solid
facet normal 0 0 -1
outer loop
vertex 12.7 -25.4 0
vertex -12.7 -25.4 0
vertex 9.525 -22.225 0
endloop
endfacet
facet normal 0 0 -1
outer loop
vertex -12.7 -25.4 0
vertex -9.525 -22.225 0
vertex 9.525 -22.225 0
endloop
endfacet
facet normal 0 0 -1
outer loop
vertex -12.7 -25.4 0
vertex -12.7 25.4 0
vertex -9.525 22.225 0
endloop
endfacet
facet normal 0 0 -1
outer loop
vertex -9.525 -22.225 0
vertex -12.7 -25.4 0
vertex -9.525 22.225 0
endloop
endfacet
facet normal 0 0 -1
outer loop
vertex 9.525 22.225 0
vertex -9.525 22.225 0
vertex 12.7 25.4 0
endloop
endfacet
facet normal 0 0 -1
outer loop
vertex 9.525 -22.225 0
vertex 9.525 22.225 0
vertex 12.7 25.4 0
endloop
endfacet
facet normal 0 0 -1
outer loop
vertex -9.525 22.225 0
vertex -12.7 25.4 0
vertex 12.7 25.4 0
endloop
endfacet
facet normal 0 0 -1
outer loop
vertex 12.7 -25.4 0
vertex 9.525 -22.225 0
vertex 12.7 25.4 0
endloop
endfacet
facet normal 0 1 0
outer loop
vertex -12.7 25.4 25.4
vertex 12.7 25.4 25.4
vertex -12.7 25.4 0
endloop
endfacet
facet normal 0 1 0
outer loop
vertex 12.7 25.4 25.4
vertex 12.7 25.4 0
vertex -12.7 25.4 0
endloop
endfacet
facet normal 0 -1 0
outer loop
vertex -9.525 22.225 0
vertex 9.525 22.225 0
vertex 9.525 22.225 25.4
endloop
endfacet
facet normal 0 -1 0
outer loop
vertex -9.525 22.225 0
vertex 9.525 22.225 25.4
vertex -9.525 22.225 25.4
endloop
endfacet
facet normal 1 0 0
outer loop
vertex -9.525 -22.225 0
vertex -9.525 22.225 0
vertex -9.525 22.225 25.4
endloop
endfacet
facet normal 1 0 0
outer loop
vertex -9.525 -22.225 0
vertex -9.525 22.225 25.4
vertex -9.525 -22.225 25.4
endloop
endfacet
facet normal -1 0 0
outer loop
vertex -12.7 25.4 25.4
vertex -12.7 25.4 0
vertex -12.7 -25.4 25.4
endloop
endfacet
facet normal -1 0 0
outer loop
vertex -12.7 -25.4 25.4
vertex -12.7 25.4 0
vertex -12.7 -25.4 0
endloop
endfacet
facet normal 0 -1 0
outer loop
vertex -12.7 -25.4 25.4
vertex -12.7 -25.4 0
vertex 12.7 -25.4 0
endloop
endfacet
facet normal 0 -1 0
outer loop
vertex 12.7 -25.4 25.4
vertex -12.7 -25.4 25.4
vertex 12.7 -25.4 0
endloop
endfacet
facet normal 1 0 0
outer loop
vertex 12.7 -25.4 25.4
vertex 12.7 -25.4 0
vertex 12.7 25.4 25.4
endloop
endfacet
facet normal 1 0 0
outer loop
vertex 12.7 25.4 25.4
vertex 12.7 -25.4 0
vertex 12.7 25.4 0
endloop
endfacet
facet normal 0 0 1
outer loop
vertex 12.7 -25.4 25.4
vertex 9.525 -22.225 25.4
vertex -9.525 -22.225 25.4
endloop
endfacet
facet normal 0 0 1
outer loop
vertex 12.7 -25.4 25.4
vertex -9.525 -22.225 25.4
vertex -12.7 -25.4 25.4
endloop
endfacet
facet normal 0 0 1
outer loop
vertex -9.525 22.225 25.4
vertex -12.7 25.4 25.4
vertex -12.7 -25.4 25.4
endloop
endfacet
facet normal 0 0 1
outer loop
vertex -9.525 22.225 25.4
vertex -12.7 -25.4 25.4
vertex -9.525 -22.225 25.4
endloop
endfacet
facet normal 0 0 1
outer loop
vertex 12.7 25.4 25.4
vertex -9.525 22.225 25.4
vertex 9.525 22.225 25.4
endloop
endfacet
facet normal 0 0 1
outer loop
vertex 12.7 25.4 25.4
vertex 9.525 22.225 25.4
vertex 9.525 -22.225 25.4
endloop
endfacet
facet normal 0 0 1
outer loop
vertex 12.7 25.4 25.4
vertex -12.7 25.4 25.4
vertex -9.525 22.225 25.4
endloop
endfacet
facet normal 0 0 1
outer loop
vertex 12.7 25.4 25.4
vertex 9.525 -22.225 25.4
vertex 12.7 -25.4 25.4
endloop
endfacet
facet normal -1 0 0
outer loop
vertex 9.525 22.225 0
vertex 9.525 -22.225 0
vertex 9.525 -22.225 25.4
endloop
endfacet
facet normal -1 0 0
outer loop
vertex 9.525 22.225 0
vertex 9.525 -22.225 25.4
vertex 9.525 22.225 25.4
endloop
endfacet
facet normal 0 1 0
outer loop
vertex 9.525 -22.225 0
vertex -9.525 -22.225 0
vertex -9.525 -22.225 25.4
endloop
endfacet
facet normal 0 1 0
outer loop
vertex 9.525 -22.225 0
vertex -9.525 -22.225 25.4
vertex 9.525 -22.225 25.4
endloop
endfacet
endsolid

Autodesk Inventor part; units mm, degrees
ref_plane "YZ Plane" through (0, 0, 0) normal (1, 0, 0) x (0, 1, 0)
ref_plane "Start Plane" through (0, 0, 0) normal (0, 0, 1) x (1, 0, 0)
ref_plane "End Plane" through (0, 0, 25.4) normal (0, 0, 1) x (1, 0, 0)
sketch "Sketch" plane through (0, 0, 0) normal (0, 0, 1) x (1, 0, 0)
  line L0 (-12.7, -25.4) -> (12.7, -25.4)
  line L1 (12.7, -25.4) -> (12.7, 25.4)
  line L2 (12.7, 25.4) -> (-12.7, 25.4)
  line L3 (-12.7, 25.4) -> (-12.7, -25.4)
  line L4 (-12.7, -25.4) -> (12.7, 25.4) construction
  line L5 (12.7, -25.4) -> (-12.7, 25.4) construction
  line L6 (-9.525, -22.225) -> (9.525, -22.225)
  line L7 (9.525, -22.225) -> (9.525, 22.225)
  line L8 (9.525, 22.225) -> (-9.525, 22.225)
  line L9 (-9.525, 22.225) -> (-9.525, -22.225)
  line L10 (-9.525, -22.225) -> (9.525, 22.225) construction
  line L11 (9.525, -22.225) -> (-9.525, 22.225) construction
  point P0 (0, 0)
  dimension "d0" = 25.4
  dimension "d1" = 50.8
  dimension "d2" = 3.175
  dimension "d3" = 3.175
extrude "Body" add sketch "Sketch" along normal up to surface (25.4 mm away) from surface at 0
sketch "Sketch6" plane through (0, 0, 0) normal (0, 0, 1) x (1, 0, 0)
  line L0 (0, 0) -> (10, 0)
ref_plane "Work Plane5" through (0, 0, 0) normal (0, -1, 0) x (1, 0, 0)
sketch "Sketch7" plane through (0, 0, 0) normal (0, -1, 0) x (1, 0, 0)
  line L0 (-2, 0) -> (12, 0)
  line L1 (-2, 25.4) -> (12, 25.4)
  dimension "d11" = 25.4
sketch "Sketch8" plane through (-12.7, -25.4, 25.4) normal (0, 0, 1) x (1, 0, 0)
  point P0 (12.7, 25.4)
equation "\"d0\" = Width"
equation "\"d1\" = Height"
equation "\"d2\" = Thickness"
equation "\"d3\" = Thickness"
equation "\"Height\" = 50.8"
equation "\"Width\" = 25.4"
equation "\"Thickness\" = 3.175"
equation "\"BaseLength\" = 25.4"
equation "\"G_OFFSET_START\" = 0"
equation "\"G_OFFSET_END\" = 0"
equation "\"d7\" = BaseLength + G_OFFSET_END"
equation "\"G_L\" = d11"
properties part number "AL RECT TUBE 2 x 1 x 0.125" material "Aluminum 6061"
